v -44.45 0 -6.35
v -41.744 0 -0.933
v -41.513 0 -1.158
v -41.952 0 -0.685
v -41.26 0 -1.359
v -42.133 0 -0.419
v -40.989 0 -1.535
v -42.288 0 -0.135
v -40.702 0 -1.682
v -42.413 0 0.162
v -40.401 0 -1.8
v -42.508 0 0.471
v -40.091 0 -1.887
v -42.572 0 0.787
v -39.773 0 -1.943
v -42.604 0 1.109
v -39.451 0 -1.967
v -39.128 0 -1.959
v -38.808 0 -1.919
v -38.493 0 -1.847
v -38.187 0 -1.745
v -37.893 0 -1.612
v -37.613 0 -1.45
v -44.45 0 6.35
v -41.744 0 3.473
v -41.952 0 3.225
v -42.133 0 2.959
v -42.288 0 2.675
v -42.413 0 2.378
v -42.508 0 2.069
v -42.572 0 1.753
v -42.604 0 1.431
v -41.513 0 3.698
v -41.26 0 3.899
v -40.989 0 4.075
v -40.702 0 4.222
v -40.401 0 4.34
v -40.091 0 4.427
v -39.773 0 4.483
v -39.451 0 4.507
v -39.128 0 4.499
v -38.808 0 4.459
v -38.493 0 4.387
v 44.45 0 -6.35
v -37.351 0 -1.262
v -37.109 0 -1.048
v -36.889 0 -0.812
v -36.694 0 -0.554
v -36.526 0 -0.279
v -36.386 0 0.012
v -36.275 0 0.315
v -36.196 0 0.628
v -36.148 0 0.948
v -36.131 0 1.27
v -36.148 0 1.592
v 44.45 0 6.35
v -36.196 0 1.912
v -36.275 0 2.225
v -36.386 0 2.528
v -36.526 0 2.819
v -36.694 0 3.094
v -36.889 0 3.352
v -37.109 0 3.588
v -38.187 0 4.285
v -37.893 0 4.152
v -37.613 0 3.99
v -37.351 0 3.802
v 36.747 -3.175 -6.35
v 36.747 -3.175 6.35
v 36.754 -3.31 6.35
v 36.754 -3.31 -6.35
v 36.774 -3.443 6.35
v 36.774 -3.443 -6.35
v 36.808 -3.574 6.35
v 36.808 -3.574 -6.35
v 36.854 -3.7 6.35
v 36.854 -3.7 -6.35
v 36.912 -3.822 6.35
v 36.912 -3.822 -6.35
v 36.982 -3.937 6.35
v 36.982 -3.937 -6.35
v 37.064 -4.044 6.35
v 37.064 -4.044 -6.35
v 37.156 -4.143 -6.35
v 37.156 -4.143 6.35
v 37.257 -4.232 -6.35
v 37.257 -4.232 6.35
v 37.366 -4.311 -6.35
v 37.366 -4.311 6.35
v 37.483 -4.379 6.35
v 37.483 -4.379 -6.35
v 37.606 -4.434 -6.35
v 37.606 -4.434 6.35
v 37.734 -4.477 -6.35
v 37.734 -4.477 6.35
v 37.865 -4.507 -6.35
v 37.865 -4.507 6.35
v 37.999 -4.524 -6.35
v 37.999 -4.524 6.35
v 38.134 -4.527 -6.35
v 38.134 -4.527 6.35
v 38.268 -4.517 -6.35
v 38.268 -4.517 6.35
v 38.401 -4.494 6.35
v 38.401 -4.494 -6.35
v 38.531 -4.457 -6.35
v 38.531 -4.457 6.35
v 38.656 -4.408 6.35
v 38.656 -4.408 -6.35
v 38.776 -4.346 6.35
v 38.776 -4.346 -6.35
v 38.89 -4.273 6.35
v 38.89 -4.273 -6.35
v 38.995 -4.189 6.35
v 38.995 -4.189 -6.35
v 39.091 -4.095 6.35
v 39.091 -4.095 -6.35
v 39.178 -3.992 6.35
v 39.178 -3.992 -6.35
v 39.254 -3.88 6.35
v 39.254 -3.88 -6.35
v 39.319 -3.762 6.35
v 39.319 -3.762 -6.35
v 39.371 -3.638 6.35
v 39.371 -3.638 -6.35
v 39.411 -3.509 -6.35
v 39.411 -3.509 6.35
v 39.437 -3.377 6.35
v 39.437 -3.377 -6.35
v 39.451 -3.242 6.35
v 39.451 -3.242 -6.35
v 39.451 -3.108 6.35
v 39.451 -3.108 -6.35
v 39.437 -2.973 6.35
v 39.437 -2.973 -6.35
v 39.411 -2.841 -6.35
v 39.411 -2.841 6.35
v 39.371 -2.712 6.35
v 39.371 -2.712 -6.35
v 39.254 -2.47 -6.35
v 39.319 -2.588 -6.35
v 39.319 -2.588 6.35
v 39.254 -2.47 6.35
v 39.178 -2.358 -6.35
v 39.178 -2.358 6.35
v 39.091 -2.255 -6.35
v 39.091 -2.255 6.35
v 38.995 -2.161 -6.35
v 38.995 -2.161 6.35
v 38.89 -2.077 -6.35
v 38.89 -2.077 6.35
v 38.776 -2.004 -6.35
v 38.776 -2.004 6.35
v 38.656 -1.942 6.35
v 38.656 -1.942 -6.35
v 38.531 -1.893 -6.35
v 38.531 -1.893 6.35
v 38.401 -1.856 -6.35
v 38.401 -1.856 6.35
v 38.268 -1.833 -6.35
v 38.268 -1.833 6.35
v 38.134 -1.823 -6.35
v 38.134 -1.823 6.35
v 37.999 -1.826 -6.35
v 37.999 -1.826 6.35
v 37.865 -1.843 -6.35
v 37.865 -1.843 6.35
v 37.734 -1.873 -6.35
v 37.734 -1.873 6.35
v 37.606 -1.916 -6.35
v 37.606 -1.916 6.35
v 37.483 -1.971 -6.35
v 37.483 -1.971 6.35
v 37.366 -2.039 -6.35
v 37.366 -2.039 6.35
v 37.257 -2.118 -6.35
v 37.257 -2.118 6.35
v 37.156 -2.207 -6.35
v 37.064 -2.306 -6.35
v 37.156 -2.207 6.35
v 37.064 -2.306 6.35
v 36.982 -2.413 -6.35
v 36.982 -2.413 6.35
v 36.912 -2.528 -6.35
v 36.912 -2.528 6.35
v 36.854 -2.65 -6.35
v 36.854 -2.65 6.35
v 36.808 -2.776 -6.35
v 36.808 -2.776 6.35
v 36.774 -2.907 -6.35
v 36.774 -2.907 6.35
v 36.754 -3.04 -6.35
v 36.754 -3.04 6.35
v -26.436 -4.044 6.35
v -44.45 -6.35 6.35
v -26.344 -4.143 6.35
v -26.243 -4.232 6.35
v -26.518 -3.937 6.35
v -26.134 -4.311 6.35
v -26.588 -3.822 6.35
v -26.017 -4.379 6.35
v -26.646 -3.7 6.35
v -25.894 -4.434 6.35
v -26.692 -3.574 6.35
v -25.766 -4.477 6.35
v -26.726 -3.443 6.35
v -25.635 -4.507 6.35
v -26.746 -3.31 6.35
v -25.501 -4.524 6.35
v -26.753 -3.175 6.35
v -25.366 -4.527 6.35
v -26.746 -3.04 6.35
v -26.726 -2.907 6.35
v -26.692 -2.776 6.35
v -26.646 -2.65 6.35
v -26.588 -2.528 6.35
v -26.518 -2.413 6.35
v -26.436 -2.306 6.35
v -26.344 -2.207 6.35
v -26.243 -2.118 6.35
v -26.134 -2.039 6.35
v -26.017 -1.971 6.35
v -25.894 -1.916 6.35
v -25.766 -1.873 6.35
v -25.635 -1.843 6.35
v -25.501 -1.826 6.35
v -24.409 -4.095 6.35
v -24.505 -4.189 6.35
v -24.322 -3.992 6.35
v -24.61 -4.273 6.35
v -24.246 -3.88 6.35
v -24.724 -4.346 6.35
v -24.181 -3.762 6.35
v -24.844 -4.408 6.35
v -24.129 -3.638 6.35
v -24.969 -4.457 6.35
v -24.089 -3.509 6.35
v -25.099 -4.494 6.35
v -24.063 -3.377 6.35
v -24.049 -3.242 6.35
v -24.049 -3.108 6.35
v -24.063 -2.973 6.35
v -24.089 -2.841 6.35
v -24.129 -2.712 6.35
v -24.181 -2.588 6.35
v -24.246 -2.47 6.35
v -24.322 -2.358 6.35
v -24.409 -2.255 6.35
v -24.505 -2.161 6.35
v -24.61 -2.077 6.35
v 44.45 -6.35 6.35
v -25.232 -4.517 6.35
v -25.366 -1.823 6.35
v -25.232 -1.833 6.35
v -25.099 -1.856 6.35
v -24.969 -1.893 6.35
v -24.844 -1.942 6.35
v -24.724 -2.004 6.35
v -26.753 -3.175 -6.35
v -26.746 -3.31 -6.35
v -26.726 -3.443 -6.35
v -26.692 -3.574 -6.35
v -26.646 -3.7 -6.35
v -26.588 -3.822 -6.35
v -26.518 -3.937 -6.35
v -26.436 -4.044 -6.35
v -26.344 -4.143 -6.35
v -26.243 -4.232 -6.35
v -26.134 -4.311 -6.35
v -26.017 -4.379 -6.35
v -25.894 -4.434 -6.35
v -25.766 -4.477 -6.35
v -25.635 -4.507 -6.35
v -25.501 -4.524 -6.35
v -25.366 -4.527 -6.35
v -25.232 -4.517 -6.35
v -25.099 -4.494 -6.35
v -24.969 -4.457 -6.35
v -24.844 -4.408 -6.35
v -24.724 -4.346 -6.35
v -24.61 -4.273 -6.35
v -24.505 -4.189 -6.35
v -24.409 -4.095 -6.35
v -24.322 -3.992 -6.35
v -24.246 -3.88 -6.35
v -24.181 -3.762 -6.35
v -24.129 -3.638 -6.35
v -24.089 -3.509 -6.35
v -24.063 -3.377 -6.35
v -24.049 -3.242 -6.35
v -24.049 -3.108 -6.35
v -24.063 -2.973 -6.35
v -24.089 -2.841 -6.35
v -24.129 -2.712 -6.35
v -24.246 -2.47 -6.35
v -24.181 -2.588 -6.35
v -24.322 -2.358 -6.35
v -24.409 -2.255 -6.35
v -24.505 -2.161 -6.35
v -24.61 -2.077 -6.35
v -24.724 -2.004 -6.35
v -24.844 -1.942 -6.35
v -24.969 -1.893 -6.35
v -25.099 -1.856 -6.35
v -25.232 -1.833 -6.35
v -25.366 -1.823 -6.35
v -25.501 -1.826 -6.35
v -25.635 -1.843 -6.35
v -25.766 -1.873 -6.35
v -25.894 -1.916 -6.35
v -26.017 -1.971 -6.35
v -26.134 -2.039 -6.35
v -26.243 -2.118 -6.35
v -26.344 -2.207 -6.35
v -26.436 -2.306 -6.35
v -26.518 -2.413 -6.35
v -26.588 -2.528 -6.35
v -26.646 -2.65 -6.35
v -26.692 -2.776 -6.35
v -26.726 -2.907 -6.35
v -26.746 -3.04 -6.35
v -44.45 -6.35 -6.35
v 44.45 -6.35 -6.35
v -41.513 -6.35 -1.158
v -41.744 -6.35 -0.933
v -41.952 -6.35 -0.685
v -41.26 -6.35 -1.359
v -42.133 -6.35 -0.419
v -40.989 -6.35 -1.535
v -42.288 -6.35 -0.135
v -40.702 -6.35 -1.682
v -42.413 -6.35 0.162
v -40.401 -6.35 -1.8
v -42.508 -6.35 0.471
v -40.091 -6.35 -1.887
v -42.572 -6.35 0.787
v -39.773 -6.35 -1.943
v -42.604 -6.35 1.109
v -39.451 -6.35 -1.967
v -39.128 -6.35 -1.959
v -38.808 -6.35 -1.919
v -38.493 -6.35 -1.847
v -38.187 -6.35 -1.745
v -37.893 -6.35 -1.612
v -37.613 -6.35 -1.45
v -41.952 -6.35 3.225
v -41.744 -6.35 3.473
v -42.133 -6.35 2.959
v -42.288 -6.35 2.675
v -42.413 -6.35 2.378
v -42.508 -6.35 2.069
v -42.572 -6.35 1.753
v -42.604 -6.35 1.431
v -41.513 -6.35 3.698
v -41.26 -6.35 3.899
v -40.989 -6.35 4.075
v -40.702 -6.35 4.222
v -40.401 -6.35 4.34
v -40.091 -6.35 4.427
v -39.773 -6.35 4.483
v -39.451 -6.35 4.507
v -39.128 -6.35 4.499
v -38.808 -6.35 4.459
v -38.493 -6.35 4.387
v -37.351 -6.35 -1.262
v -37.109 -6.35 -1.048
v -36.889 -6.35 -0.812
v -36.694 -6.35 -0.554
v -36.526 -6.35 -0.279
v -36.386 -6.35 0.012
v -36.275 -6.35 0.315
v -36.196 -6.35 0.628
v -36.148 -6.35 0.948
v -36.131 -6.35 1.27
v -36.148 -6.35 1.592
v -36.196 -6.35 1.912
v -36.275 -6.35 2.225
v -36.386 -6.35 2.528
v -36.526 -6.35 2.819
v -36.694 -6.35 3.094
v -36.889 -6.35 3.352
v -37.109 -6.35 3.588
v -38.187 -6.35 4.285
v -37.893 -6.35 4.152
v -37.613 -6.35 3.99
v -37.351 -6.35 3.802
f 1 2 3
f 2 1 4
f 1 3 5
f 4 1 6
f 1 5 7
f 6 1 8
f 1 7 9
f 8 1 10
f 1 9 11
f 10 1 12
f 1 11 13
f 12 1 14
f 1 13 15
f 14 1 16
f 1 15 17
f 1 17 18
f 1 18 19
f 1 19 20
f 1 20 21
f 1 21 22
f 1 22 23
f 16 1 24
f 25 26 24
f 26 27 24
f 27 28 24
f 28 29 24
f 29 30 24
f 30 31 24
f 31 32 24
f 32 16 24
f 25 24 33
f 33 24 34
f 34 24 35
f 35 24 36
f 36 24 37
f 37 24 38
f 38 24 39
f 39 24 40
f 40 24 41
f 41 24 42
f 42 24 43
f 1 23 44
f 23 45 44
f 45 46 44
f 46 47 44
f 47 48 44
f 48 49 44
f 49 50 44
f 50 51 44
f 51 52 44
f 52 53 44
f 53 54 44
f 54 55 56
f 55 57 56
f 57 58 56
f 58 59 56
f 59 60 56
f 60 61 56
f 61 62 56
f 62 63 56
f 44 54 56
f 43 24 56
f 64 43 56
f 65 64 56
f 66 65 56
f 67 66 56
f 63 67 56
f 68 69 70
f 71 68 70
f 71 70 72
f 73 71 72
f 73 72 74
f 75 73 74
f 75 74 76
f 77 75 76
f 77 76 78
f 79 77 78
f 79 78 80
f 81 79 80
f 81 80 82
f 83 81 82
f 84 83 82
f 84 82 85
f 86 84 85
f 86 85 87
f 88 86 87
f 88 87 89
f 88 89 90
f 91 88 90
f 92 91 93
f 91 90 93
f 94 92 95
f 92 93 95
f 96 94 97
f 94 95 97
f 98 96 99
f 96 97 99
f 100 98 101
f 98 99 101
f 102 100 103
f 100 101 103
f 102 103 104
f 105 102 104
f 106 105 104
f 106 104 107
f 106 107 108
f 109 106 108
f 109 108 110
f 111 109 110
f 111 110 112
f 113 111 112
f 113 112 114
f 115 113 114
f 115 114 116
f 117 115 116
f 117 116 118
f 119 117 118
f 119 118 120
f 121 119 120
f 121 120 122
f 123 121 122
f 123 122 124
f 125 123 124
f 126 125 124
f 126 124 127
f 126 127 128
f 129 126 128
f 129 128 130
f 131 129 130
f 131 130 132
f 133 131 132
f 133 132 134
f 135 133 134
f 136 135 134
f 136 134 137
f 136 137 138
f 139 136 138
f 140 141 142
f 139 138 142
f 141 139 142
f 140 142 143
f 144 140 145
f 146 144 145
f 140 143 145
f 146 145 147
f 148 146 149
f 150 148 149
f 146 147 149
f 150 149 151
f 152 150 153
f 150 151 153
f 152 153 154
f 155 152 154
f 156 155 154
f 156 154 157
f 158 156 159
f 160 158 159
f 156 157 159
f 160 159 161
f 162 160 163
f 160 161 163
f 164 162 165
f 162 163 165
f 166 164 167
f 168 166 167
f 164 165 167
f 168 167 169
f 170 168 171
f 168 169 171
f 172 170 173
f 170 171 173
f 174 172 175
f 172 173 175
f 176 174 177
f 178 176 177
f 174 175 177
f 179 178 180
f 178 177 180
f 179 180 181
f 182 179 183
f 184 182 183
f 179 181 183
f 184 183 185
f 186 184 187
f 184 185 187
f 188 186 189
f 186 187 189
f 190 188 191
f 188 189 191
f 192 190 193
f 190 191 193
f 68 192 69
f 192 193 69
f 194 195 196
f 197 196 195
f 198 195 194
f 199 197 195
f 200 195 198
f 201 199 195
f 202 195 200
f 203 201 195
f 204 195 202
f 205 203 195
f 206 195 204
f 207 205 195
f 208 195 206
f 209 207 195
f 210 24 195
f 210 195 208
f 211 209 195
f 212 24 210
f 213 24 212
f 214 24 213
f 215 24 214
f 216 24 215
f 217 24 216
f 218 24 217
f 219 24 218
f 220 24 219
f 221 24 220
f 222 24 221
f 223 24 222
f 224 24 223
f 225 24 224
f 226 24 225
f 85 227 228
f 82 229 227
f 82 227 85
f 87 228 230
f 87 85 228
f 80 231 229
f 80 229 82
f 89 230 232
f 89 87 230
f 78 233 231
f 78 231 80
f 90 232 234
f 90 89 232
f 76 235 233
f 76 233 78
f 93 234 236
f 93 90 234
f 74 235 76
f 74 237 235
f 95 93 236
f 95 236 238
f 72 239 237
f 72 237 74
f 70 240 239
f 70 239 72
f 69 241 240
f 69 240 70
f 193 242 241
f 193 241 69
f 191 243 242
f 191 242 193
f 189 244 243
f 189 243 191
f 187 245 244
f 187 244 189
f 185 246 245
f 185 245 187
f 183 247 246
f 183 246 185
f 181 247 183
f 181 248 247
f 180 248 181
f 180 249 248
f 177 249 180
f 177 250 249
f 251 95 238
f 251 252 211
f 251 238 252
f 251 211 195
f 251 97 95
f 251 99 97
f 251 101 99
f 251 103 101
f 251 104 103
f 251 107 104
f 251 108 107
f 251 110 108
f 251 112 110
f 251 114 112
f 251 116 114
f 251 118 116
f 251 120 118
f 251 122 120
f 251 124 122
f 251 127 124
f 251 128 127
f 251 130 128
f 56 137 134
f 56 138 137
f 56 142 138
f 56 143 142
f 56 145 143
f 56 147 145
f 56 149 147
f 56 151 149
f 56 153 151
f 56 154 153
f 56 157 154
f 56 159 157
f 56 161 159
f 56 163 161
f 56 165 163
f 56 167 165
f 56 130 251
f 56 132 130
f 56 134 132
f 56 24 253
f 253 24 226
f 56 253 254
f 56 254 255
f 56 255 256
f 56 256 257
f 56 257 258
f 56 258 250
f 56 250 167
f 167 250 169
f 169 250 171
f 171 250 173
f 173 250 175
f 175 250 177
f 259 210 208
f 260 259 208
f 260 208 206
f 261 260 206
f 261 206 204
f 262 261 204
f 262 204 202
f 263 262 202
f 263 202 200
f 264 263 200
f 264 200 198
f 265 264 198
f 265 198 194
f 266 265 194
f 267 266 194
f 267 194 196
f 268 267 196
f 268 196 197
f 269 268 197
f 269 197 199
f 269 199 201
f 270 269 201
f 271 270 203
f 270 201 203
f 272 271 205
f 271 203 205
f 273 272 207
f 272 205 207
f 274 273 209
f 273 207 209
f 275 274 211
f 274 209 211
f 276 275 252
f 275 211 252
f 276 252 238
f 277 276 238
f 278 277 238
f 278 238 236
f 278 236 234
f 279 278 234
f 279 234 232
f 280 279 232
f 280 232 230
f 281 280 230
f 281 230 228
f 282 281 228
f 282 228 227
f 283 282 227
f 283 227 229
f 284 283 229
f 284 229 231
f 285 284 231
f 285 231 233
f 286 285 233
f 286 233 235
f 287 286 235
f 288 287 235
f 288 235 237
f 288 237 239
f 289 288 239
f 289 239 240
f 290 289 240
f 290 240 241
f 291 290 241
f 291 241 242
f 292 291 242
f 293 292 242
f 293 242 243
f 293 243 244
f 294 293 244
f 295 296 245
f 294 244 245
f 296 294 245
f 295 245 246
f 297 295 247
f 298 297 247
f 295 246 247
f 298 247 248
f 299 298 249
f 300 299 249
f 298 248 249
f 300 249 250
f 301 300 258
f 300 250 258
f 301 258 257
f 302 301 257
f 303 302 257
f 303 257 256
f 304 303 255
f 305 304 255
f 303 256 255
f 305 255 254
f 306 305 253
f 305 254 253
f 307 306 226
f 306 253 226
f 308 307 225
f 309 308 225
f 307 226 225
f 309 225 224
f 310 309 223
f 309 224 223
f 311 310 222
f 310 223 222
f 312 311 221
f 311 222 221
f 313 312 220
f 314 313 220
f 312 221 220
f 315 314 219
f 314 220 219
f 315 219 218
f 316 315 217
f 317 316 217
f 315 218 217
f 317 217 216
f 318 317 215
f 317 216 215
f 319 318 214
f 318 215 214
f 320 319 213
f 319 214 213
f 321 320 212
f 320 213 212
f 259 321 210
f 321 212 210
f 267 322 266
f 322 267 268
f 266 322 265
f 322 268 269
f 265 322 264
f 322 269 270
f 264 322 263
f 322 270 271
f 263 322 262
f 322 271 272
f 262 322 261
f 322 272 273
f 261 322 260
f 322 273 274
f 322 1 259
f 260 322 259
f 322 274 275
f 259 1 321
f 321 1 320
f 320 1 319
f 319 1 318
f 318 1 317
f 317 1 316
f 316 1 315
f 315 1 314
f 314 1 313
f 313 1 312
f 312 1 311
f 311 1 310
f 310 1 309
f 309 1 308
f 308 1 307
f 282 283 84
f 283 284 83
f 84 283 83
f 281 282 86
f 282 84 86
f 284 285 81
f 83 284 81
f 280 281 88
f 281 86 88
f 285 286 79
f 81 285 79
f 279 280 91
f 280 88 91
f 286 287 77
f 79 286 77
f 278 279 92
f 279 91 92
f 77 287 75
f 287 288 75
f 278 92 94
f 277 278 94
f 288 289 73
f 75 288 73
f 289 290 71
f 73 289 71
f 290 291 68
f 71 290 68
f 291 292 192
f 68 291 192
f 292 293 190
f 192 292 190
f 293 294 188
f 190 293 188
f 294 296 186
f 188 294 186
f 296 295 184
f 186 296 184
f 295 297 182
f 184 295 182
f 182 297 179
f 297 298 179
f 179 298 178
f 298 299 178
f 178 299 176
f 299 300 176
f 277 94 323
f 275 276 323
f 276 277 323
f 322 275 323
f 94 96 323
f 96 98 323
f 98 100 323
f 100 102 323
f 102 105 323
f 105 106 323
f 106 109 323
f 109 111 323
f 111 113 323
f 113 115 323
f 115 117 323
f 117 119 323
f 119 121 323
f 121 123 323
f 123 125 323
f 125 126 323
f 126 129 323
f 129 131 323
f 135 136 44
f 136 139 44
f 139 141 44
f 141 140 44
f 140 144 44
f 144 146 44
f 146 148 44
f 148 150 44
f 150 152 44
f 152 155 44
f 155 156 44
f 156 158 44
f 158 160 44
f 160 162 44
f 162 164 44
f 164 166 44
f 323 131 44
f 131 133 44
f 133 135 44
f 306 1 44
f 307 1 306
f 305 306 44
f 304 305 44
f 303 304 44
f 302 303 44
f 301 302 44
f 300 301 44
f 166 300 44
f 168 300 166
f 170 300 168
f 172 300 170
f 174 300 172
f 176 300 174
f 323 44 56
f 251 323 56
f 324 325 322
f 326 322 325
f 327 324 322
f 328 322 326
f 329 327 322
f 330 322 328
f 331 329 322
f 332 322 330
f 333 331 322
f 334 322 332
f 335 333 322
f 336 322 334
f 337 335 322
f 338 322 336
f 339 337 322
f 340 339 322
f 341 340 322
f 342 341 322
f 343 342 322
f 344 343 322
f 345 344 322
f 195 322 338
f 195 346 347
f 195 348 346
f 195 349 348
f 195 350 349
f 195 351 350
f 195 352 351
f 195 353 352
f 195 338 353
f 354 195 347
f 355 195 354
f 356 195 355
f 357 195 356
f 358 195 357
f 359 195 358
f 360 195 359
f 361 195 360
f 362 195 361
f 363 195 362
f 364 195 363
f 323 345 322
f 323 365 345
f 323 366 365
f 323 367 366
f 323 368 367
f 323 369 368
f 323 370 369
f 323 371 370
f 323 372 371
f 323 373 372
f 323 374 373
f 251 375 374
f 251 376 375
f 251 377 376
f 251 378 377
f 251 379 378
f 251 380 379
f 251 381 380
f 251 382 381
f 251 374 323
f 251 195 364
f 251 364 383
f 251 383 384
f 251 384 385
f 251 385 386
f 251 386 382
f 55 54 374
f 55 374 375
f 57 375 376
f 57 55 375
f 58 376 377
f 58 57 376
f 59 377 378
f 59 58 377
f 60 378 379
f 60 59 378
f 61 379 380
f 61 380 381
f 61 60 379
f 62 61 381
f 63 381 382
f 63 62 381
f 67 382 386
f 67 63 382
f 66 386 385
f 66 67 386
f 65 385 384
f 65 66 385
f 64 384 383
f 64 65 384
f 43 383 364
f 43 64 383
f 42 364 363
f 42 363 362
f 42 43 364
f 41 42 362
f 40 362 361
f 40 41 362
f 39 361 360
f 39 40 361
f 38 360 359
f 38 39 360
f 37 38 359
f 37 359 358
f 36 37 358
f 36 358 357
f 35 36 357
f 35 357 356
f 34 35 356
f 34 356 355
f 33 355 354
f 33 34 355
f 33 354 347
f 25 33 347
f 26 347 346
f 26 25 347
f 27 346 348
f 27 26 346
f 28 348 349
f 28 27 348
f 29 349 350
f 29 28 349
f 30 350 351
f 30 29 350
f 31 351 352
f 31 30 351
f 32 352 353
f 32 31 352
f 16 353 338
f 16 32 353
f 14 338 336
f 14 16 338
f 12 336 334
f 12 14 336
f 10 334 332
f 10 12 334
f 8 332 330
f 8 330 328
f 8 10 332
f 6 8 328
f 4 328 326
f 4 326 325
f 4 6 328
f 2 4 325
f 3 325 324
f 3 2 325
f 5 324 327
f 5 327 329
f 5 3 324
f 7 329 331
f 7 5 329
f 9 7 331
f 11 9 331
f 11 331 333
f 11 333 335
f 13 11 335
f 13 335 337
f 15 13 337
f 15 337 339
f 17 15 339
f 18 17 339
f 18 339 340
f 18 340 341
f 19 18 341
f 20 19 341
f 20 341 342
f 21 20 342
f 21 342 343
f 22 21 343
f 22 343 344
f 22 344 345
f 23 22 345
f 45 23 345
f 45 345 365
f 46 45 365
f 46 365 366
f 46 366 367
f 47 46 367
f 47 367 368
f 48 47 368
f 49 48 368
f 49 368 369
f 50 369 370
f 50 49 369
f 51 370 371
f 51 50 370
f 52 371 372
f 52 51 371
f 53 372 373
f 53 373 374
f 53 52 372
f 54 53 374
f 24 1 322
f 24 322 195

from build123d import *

# Parameters (mm, degrees)
F0_W     = 88.9
F0_H     = 12.7
F0_R     = 3.2385
F1_DEPTH = 6.35
F3_D     = 2.7051


with BuildPart() as f1:
    # F0 (on Front) → F1 (new body)
    with BuildSketch(Plane.XZ):
        Rectangle(F0_W, F0_H)
        with Locations((-39.37, 1.27)):
            Circle(F0_R, mode=Mode.SUBTRACT)
    extrude(amount=F1_DEPTH)

    # F3 (through all)
    with Locations(Plane(origin=(0, 0, -6.35), x_dir=(1, 0, 0), z_dir=(0, 0, -1))):
        with Locations((-25.4, 3.175), (38.1, 3.175)):
            Hole(F3_D / 2)


solid = f1.part
